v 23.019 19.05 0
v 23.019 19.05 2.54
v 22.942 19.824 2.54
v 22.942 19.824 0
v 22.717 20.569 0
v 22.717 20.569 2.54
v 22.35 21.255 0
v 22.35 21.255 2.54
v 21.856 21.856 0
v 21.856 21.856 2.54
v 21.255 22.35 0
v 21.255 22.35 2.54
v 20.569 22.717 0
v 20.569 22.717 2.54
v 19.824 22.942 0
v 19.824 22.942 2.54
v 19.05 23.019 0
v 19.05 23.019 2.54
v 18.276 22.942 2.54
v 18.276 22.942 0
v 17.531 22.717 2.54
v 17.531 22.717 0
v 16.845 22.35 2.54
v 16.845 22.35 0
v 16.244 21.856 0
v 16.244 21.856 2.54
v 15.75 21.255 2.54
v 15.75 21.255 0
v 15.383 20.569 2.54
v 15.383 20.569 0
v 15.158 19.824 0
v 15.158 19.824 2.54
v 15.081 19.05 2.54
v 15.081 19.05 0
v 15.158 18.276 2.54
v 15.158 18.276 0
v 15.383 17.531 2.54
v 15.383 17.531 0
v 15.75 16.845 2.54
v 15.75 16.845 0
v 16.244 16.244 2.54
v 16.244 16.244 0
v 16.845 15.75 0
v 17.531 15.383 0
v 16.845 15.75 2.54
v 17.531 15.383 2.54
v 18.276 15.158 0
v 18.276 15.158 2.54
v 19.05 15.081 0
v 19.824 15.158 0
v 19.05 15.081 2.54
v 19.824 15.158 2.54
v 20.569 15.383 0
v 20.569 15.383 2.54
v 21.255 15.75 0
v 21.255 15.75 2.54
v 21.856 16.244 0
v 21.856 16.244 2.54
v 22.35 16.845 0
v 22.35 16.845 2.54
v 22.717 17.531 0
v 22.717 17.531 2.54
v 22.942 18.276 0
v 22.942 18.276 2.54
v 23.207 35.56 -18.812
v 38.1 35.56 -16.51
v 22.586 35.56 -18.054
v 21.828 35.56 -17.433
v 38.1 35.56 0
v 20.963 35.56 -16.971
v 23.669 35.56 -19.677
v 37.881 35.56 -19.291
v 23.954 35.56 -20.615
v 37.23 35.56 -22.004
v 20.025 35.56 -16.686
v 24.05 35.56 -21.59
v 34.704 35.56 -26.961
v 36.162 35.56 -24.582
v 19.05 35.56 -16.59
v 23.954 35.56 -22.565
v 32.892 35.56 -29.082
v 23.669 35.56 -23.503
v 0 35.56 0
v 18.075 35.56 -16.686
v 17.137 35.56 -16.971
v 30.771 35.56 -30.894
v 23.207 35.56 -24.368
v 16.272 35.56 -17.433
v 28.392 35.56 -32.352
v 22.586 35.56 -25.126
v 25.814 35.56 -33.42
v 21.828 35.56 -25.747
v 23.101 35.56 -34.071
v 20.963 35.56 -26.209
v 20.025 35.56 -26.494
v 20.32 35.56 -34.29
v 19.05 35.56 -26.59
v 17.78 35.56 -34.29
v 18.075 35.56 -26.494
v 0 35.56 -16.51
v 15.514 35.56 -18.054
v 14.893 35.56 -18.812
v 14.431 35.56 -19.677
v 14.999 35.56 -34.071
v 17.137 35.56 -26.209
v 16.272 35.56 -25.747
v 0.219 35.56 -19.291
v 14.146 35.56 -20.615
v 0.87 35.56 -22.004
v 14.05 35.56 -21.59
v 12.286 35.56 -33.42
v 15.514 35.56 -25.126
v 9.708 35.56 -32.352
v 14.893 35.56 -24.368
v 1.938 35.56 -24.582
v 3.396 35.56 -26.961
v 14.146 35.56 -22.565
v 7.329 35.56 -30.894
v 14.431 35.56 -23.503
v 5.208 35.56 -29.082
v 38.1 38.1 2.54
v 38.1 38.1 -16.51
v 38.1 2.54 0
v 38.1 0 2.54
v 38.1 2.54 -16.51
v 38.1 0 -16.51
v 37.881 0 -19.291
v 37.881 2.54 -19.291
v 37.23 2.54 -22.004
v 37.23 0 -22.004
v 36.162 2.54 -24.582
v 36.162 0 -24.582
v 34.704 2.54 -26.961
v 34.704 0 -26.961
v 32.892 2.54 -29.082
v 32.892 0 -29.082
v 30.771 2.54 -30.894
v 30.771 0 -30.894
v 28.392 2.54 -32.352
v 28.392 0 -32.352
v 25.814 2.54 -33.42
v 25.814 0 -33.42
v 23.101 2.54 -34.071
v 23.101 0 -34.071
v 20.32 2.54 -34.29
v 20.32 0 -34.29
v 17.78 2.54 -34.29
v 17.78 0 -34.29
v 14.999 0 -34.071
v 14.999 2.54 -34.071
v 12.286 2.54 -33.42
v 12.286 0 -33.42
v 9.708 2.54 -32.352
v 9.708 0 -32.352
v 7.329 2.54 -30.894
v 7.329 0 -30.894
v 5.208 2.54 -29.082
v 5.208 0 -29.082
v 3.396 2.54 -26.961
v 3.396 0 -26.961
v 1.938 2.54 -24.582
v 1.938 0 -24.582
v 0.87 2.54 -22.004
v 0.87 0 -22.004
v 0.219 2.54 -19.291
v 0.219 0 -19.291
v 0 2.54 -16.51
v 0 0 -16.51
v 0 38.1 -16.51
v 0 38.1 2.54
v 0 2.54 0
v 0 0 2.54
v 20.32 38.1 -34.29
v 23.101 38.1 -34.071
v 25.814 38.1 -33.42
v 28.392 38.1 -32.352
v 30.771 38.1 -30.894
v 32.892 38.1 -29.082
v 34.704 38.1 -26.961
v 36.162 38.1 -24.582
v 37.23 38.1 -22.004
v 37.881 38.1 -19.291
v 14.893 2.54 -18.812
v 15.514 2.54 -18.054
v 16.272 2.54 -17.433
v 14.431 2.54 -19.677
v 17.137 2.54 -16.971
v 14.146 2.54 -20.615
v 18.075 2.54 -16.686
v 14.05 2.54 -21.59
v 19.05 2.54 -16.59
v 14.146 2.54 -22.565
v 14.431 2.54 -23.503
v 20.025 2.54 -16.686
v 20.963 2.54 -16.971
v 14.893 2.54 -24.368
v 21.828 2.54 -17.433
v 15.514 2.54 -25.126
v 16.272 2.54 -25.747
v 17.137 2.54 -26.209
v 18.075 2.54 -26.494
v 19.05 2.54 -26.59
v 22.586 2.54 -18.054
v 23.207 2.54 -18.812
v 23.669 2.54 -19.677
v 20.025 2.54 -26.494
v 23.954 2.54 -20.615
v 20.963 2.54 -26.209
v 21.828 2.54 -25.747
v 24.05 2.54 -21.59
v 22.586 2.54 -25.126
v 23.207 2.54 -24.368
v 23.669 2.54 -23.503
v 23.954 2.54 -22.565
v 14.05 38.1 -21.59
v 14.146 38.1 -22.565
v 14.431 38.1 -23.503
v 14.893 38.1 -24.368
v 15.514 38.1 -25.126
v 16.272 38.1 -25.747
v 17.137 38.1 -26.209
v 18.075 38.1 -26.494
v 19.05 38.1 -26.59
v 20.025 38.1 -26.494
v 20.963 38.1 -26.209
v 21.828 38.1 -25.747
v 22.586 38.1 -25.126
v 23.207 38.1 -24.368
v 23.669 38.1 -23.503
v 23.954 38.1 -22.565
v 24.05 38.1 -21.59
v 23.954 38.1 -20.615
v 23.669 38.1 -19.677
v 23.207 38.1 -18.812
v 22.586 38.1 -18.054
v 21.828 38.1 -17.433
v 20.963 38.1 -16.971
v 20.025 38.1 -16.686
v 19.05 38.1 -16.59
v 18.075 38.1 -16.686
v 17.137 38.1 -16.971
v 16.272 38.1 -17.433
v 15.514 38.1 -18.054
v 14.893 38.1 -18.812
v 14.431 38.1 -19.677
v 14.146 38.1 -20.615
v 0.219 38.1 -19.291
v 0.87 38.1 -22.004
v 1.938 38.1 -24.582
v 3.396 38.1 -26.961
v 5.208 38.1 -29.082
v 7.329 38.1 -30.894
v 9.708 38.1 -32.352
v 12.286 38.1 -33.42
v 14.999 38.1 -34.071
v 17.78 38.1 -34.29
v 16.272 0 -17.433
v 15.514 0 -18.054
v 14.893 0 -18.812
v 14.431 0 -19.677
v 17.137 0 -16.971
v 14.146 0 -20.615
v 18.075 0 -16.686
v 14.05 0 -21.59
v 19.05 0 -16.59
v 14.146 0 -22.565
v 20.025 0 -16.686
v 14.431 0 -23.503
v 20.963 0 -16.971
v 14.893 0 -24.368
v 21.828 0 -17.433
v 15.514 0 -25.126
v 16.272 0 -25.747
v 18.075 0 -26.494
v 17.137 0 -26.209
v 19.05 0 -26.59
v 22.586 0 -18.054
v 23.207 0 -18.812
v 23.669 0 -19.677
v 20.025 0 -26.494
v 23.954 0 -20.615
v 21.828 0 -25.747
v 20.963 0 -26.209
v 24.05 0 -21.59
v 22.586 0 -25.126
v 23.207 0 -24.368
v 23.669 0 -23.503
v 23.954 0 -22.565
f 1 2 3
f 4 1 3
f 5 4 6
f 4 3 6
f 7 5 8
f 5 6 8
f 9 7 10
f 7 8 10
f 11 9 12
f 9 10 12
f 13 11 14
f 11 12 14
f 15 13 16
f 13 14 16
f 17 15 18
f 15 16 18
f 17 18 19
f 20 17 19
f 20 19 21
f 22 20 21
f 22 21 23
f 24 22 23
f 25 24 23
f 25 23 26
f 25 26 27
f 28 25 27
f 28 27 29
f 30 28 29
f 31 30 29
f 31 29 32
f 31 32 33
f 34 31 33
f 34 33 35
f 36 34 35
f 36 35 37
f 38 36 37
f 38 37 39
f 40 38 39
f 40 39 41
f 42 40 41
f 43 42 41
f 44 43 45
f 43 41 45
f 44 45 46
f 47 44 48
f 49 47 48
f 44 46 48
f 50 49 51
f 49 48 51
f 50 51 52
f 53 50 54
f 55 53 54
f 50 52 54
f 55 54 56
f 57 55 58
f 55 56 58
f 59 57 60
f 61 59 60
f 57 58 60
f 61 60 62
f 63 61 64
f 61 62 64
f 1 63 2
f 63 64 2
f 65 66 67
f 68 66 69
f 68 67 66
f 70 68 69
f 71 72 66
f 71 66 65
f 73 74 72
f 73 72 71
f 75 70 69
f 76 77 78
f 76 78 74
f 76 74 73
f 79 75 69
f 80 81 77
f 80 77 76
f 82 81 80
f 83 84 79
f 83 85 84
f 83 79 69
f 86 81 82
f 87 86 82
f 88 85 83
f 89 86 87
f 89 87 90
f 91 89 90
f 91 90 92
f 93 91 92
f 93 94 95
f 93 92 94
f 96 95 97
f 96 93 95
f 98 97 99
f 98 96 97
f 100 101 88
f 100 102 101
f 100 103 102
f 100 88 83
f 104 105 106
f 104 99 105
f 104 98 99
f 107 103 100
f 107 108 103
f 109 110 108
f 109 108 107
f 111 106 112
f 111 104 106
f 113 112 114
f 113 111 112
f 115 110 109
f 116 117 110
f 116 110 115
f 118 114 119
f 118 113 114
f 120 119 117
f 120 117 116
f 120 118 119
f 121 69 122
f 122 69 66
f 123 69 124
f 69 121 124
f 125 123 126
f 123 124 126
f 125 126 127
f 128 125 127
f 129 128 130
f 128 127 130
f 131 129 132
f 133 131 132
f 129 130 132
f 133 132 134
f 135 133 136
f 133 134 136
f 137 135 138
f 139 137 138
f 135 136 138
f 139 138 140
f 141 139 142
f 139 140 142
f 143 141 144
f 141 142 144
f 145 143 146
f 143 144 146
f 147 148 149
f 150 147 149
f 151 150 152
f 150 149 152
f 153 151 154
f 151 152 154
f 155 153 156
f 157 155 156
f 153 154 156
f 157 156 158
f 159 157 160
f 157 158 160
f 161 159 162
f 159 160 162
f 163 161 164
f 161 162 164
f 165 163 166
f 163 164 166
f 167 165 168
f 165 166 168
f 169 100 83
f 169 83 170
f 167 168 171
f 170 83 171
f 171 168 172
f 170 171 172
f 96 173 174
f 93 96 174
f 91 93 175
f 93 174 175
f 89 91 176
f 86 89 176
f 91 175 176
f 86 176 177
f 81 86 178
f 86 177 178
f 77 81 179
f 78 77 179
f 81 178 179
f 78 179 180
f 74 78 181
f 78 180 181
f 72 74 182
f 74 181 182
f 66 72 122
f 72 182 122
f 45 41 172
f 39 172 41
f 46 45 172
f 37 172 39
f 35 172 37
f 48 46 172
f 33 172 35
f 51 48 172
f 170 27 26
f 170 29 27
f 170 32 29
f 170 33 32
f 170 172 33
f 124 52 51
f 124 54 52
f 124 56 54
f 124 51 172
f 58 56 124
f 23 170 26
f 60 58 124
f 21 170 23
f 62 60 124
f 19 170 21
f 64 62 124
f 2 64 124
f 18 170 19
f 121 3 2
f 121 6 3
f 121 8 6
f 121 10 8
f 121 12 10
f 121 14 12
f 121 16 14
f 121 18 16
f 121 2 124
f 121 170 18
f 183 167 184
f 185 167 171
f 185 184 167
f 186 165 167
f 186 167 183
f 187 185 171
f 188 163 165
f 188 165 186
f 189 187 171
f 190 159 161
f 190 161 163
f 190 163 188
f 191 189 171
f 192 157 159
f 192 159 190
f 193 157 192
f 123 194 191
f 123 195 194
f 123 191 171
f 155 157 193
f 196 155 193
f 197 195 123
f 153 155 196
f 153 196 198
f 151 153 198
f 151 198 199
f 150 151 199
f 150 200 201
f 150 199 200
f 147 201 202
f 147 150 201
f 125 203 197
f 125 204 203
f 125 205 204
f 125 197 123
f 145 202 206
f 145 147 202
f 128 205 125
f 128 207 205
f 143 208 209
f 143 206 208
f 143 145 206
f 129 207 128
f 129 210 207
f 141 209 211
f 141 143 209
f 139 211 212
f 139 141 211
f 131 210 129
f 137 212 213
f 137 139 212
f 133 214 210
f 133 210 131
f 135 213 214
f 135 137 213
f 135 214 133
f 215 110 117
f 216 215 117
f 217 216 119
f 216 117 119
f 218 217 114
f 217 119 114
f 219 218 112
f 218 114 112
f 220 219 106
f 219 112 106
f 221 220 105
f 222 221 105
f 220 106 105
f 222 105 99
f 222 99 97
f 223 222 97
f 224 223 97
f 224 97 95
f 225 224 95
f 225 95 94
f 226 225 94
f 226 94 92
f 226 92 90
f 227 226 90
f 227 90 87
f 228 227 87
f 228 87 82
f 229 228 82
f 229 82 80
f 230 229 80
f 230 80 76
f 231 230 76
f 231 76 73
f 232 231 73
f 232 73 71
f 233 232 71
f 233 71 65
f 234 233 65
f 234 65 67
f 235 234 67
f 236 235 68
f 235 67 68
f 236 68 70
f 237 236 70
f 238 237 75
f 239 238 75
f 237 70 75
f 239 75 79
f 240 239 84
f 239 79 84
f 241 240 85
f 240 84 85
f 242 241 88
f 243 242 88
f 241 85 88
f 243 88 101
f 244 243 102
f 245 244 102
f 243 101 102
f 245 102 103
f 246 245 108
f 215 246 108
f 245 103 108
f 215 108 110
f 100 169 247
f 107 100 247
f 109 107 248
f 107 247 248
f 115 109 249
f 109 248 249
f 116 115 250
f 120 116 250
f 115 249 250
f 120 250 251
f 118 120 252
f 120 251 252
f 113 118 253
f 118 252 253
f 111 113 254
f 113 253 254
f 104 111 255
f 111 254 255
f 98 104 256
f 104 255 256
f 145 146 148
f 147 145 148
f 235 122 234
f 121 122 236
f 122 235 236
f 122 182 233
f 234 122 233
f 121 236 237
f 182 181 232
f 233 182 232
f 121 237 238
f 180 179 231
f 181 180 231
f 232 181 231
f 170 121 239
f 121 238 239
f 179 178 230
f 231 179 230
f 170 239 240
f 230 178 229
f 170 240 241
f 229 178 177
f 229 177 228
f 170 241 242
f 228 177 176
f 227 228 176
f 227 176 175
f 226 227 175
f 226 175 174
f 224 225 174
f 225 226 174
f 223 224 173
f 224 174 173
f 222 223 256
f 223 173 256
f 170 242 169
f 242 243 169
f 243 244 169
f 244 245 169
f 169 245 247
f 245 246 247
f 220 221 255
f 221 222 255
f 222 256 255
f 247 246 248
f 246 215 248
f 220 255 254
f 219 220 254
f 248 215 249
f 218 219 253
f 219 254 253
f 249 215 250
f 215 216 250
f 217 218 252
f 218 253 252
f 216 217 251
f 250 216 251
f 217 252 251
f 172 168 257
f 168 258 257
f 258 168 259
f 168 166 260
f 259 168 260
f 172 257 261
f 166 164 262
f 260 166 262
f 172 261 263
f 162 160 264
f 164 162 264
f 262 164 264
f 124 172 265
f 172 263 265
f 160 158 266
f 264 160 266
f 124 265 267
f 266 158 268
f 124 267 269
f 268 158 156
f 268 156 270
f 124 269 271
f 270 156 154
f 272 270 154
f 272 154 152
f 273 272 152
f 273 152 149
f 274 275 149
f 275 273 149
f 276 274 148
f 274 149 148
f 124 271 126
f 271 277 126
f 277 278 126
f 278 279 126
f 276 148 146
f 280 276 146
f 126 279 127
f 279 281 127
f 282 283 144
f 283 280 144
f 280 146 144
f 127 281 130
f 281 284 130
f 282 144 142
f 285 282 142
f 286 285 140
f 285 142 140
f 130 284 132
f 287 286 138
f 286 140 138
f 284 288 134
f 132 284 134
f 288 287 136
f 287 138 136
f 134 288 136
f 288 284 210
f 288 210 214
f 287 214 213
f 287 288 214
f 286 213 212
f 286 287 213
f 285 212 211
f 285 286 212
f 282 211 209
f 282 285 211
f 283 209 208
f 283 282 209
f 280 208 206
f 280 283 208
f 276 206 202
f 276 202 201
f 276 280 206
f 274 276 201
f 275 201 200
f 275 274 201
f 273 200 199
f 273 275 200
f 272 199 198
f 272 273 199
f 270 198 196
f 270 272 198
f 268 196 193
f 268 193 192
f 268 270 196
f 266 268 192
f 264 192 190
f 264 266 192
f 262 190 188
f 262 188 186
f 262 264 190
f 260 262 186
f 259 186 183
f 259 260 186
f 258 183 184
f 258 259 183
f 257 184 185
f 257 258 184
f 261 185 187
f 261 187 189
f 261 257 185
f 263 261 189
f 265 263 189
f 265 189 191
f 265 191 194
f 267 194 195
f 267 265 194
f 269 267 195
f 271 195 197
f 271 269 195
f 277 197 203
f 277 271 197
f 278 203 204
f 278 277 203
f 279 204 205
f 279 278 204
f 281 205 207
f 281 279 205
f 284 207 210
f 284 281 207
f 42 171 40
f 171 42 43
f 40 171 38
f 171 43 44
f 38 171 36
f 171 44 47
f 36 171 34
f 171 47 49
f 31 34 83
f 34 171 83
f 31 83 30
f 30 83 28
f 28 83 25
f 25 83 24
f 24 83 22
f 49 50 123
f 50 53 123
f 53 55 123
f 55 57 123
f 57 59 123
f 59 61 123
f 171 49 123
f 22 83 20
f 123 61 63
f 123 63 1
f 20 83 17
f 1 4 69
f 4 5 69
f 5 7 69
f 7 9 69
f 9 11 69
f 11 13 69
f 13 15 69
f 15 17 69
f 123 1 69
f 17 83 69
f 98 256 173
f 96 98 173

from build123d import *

# Parameters (mm, degrees)
SKETCH2_W                      = 38.1
SKETCH2_H                      = 38.1
BOSS_EXTRUDE1_DEPTH            = 2.54
F_5_16_0_3125_DIAMETER_HOLE1_D = 7.9375
BOSS_EXTRUDE2_DEPTH            = 2.54
F_10_0MM_DOWEL_HOLE1_D         = 10


with BuildPart() as part:
    # Sketch2 → Boss-Extrude1 (new body)
    with BuildSketch(Plane.XY):
        with Locations((19.05, 19.05)):
            Rectangle(SKETCH2_W, SKETCH2_H)
    boss_extrude1 = extrude(amount=BOSS_EXTRUDE1_DEPTH)

    # 5/16 (0.3125) Diameter Hole1 (through all)
    with Locations(Plane(origin=(19.05, 19.05, 0), x_dir=(-1, 0, 0), z_dir=(0, 0, -1))):
        with Locations((0, 0)):
            f_5_16_0_3125_diameter_hole1 = Hole(F_5_16_0_3125_DIAMETER_HOLE1_D / 2)

    # Sketch4 → Boss-Extrude2 (add)
    with BuildSketch(Plane(origin=(0, 38.1, 0), x_dir=(1, 0, 0), z_dir=(0, 1, 0))):
        with BuildLine():
            Line((0, 0), (0, 16.51))
            ThreePointArc((0, 16.51), (5.207641431, 29.082358569), (17.78, 34.29))
            Line((17.78, 34.29), (20.32, 34.29))
            ThreePointArc((20.32, 34.29), (32.892358569, 29.082358569), (38.1, 16.51))
            Line((38.1, 16.51), (38.1, 0))
            Line((38.1, 0), (38.1, -2.54))
            Line((38.1, -2.54), (0, -2.54))
            Line((0, -2.54), (0, 0))
        make_face()
    boss_extrude2 = extrude(amount=-BOSS_EXTRUDE2_DEPTH)

    # Ø10.0mm Dowel Hole1 (through all)
    with Locations(Plane(origin=(0, 38.1, 0), x_dir=(1, 0, 0), z_dir=(0, 1, 0))):
        with Locations((19.05, 21.59)):
            f_10_0mm_dowel_hole1 = Hole(F_10_0MM_DOWEL_HOLE1_D / 2)

    # Mirror4: Boss-Extrude1, 5/16 (0.3125) Diameter Hole1, Boss-Extrude2, Ø10.0mm Dowel Hole1 across plane
    add(boss_extrude1.mirror(Plane(origin=(0, 19.05, 0), x_dir=(0, 0, 1), z_dir=(0, -1, 0))))
    add(f_5_16_0_3125_diameter_hole1.mirror(Plane(origin=(0, 19.05, 0), x_dir=(0, 0, 1), z_dir=(0, -1, 0))), mode=Mode.SUBTRACT)
    add(boss_extrude2.mirror(Plane(origin=(0, 19.05, 0), x_dir=(0, 0, 1), z_dir=(0, -1, 0))))
    add(f_10_0mm_dowel_hole1.mirror(Plane(origin=(0, 19.05, 0), x_dir=(0, 0, 1), z_dir=(0, -1, 0))), mode=Mode.SUBTRACT)


solid = part.part
